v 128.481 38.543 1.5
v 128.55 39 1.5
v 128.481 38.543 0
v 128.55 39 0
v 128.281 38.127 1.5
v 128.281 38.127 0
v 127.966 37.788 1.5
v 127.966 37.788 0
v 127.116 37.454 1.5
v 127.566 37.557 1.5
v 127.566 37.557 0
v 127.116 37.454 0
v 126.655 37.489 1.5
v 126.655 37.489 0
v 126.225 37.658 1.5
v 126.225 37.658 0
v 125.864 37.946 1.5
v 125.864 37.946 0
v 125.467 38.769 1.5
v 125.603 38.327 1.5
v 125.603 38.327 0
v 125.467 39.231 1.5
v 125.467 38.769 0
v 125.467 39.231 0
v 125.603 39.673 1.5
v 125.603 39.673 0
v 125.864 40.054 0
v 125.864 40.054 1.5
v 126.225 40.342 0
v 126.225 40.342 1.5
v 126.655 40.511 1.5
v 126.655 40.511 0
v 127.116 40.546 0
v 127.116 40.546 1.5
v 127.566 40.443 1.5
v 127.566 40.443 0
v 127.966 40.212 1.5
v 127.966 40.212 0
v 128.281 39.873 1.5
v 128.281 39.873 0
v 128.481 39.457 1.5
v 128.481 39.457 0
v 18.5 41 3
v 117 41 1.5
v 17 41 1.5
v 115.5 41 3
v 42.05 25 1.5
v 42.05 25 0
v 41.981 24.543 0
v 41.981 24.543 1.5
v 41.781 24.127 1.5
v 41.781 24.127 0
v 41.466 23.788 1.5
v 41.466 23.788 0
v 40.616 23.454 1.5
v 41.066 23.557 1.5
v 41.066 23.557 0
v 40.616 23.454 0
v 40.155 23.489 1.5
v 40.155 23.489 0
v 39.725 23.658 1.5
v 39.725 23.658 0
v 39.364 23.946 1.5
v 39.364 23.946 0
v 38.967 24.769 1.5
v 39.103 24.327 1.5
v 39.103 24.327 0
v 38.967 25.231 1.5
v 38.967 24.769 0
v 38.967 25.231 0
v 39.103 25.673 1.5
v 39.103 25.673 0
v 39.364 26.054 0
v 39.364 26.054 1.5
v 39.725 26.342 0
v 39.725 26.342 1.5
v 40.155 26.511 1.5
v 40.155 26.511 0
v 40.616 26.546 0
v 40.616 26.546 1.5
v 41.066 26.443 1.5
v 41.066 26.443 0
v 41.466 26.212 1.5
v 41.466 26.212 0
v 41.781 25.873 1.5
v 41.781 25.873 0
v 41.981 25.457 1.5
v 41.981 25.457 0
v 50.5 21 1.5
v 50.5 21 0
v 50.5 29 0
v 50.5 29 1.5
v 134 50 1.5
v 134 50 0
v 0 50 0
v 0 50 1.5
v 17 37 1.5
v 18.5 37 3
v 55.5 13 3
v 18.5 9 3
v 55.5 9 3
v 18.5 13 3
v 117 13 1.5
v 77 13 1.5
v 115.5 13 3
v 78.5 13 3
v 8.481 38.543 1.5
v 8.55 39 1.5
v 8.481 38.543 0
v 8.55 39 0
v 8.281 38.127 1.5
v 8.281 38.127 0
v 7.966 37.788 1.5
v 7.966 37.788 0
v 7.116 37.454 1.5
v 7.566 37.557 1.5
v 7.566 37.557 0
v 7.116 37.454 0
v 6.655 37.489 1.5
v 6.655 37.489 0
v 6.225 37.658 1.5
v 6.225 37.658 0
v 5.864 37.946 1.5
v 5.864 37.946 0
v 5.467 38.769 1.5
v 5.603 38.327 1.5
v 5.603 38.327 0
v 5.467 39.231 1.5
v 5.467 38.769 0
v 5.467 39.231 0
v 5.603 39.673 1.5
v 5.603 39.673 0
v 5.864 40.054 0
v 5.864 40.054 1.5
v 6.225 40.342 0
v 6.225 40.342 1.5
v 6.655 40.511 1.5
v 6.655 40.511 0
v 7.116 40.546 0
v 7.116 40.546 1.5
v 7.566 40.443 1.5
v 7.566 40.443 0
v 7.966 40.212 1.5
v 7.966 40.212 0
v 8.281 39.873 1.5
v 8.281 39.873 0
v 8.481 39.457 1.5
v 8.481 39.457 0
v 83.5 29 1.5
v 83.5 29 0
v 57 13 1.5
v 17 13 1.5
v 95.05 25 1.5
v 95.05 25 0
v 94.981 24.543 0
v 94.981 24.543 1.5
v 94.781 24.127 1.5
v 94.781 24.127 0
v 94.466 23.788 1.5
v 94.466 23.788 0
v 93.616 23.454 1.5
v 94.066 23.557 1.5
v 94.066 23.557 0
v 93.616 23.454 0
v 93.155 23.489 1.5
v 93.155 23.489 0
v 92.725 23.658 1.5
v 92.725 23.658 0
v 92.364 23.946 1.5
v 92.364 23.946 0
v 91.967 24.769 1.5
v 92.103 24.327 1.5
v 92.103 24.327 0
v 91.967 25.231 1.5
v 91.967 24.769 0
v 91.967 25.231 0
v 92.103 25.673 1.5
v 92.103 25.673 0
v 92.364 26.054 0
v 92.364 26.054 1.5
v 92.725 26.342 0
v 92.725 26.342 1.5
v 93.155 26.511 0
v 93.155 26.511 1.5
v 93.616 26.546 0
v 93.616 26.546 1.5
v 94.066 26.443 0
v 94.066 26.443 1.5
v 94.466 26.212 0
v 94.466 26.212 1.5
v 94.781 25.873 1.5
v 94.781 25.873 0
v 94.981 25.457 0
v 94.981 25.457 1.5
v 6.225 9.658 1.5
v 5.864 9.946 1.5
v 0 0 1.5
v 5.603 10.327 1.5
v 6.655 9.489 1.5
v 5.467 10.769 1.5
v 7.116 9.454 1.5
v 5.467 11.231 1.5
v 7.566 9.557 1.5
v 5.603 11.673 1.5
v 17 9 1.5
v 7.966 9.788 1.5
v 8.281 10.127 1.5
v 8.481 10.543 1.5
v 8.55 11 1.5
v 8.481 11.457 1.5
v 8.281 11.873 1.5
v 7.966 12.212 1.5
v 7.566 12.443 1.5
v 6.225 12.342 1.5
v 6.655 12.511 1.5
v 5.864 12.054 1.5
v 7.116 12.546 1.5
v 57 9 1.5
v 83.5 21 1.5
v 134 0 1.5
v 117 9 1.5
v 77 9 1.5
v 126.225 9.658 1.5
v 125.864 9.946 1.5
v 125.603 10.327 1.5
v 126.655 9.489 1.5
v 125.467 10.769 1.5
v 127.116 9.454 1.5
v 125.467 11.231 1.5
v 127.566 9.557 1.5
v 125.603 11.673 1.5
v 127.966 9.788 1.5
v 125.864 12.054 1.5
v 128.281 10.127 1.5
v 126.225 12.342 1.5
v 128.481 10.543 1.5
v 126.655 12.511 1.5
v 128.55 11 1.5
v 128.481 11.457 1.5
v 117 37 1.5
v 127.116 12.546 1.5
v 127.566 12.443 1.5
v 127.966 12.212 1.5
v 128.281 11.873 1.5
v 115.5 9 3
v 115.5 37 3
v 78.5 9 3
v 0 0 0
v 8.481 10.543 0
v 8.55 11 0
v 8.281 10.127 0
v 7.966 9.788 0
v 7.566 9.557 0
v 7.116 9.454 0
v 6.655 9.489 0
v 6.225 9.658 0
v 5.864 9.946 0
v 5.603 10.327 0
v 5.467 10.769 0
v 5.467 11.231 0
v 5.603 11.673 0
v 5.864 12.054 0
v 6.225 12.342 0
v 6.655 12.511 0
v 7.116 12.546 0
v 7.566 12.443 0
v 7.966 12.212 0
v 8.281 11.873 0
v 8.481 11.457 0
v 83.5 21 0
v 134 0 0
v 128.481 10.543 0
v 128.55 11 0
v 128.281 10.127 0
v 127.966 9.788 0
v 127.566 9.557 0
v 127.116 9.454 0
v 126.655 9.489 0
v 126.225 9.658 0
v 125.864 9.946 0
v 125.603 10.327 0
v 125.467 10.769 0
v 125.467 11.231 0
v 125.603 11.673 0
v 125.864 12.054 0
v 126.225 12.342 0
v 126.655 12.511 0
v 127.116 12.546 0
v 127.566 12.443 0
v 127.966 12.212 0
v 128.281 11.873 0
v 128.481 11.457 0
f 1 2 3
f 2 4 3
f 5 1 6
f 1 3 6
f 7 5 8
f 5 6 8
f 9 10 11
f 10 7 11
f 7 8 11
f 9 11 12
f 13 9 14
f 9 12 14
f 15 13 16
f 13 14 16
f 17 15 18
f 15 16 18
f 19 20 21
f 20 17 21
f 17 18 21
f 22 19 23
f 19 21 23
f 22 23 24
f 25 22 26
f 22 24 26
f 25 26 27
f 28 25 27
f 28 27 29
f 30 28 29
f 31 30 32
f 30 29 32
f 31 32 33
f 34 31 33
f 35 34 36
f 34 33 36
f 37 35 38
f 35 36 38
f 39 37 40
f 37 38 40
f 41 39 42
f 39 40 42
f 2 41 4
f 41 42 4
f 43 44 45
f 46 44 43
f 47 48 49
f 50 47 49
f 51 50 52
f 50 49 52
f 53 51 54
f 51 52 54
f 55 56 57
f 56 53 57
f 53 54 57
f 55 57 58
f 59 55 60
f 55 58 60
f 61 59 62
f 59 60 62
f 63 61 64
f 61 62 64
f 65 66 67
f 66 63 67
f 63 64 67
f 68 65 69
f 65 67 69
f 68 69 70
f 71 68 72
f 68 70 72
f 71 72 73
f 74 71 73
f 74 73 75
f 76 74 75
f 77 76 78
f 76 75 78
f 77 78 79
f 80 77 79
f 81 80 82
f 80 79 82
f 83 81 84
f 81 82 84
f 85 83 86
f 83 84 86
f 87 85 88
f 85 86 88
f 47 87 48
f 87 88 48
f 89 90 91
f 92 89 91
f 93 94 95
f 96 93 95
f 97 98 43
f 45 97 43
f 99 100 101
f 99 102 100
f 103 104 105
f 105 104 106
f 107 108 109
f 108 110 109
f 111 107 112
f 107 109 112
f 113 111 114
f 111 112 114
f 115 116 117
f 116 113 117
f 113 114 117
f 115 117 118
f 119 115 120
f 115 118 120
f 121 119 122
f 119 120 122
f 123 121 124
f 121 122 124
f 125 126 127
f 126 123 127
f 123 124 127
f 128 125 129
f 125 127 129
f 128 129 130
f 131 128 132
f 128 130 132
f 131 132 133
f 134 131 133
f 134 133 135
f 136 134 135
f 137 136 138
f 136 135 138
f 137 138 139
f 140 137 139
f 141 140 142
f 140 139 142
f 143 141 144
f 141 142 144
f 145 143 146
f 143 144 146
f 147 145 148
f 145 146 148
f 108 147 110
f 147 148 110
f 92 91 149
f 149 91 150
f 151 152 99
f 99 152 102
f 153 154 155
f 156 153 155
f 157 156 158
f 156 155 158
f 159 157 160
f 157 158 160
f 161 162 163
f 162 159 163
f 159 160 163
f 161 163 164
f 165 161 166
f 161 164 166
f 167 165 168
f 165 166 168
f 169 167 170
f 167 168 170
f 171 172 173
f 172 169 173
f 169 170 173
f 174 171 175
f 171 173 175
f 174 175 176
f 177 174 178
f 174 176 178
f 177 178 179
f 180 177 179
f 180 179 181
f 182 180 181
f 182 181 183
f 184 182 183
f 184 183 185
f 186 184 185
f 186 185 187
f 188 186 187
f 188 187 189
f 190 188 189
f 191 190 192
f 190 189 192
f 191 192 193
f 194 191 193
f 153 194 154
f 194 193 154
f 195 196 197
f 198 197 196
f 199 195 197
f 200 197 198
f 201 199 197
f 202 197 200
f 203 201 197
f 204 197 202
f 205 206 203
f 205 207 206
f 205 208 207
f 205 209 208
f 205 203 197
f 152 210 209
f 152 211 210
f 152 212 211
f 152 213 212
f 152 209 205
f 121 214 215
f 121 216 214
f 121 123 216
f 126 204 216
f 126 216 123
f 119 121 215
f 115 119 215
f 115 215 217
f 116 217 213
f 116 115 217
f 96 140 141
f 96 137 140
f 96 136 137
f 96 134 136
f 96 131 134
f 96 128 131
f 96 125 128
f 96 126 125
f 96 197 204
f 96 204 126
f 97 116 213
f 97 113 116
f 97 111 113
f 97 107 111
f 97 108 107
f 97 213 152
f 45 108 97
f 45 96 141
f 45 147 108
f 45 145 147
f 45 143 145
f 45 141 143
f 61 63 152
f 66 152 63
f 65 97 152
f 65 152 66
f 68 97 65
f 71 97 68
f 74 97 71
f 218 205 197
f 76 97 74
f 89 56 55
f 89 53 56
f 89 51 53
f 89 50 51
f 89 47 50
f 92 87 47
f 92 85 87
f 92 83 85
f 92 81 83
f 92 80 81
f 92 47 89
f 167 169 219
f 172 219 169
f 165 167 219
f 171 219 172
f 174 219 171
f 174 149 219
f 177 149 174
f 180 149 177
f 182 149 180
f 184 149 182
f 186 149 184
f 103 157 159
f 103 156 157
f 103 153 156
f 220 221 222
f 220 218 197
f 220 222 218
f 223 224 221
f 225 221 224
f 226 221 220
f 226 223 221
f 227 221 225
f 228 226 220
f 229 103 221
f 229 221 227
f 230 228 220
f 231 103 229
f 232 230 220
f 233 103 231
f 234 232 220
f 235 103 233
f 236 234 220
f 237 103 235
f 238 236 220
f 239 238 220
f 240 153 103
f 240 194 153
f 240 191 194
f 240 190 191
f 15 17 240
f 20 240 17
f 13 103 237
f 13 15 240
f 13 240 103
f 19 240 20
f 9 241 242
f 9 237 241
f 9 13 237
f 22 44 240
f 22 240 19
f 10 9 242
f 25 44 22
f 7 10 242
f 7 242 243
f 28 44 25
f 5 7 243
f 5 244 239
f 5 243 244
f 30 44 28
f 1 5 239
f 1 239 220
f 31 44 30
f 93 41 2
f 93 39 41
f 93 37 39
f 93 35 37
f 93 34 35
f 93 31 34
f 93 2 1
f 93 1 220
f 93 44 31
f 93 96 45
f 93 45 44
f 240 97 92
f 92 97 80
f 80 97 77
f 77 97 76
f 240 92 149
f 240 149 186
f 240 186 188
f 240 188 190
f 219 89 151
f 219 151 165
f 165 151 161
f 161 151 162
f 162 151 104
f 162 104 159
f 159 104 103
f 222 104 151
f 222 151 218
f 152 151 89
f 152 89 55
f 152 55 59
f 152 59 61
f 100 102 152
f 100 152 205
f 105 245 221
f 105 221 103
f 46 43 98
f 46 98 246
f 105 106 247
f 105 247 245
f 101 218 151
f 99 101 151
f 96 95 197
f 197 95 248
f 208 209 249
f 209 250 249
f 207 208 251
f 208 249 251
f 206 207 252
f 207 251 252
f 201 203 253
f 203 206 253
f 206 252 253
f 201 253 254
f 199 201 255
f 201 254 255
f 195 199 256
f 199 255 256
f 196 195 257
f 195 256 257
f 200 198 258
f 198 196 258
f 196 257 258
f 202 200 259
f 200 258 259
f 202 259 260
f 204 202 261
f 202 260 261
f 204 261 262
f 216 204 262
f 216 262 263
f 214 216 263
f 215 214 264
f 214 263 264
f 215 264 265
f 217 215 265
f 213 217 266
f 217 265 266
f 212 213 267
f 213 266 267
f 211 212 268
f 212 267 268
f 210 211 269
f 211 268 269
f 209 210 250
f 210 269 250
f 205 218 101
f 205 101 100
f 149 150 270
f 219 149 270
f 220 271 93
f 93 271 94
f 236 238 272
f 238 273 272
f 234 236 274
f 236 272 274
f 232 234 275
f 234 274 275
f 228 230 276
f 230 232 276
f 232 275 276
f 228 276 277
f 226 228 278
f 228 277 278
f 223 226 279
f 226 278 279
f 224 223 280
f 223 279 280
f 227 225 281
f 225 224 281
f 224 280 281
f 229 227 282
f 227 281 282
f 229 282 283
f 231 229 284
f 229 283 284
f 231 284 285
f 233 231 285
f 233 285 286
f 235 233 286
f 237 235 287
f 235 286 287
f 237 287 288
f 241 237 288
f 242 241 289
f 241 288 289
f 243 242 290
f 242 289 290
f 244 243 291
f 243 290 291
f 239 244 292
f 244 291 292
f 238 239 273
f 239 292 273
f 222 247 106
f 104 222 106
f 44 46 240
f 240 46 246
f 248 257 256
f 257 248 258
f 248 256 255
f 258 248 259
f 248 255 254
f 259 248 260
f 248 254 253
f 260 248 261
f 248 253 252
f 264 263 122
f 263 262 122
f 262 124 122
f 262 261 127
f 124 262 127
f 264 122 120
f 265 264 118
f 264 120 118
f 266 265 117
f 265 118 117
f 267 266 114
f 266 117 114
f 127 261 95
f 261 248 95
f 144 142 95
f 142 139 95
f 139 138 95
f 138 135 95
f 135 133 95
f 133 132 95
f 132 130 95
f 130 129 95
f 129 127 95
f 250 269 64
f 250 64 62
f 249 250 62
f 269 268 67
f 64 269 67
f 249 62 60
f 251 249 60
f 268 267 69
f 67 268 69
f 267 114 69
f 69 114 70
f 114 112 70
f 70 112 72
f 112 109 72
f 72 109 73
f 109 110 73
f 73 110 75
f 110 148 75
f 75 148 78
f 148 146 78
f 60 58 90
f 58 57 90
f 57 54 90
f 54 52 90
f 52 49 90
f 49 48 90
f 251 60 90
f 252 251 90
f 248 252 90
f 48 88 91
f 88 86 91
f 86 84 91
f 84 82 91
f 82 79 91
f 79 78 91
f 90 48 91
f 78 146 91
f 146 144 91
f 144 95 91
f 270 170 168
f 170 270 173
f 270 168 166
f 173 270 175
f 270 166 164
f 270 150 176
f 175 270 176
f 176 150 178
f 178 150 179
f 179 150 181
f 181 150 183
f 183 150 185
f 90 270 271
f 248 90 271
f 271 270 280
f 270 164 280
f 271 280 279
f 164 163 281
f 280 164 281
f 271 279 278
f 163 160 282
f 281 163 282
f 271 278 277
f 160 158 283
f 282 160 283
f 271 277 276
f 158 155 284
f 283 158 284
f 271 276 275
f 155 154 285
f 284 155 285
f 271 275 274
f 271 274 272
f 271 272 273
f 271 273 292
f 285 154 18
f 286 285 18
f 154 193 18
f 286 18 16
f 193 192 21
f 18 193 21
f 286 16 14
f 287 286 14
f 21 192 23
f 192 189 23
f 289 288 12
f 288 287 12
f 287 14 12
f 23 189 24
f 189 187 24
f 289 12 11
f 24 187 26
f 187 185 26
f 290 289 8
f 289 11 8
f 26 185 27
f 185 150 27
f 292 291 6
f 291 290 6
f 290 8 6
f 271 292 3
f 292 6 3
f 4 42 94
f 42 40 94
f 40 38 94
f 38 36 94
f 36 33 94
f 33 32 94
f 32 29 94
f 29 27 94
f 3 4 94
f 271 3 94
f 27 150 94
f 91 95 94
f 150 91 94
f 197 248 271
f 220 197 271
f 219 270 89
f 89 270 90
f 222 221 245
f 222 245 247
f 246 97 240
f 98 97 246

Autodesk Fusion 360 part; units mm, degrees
sketch "Sketch1" plane through (0, 0, 0) normal (0, 0, 1) x (1, 0, 0)
  line L0 (0, 0) -> (134, 0)
  line L1 (134, 0) -> (134, 50)
  line L2 (134, 50) -> (0, 50)
  line L3 (0, 50) -> (0, 0)
  circle A0 centre (7, 39) radius 1.55
  circle A1 centre (7, 11) radius 1.55
  circle A2 centre (127, 39) radius 1.55
  circle A3 centre (127, 11) radius 1.55
  line L4 (83.5, 21) -> (50.5, 21)
  line L5 (50.5, 21) -> (50.5, 29)
  line L6 (50.5, 29) -> (83.5, 29)
  line L7 (83.5, 29) -> (83.5, 21)
  line L8 (83.5, 21) -> (50.5, 29) construction
  line L9 (50.5, 21) -> (83.5, 29) construction
  line L10 (0, 25) -> (134, 25) construction
  circle A4 centre (40.5, 25) radius 1.55
  circle A5 centre (93.5, 25) radius 1.55
  line L11 (7, 11) -> (127, 11) construction
  line L12 (117, 9) -> (17, 9)
  line L13 (17, 9) -> (17, 13)
  line L14 (17, 13) -> (117, 13)
  line L15 (117, 13) -> (117, 9)
  line L16 (117, 9) -> (17, 13) construction
  line L17 (17, 9) -> (117, 13) construction
  line L18 (117, 41) -> (17, 41)
  line L19 (17, 41) -> (17, 37)
  line L20 (17, 37) -> (117, 37)
  line L21 (117, 37) -> (117, 41)
  line L22 (77, 9) -> (57, 9)
  line L23 (57, 9) -> (57, 13)
  line L24 (57, 13) -> (77, 13)
  line L25 (77, 13) -> (77, 9)
  line L26 (77, 9) -> (57, 13) construction
  line L27 (57, 9) -> (77, 13) construction
  point P0 (67, 25)
  point P1 (67, 11)
  point P2 (67, 11)
  dimension "d1" = 134
  dimension "d2" = 50
  dimension "d3" = 3.1
  dimension "d4" = 11
  dimension "d5" = 7
  dimension "d6" = 3.1
  dimension "d7" = 3.1
  dimension "d8" = 3.1
  dimension "d9" = 7
  dimension "d10" = 11
  dimension "d11" = 11
  dimension "d12" = 7
  dimension "d13" = 7
  dimension "d14" = 11
  dimension "d15" = 33
  dimension "d16" = 8
  dimension "d17" = 21
  dimension "d18" = 50.5
  dimension "d19" = 3.1
  dimension "d20" = 26.5
  dimension "d21" = 3.1
  dimension "d22" = 26.5
  dimension "d28" = 4
extrude "Extrude1" add sketch "Sketch1" along normal blind 1.5 contours L0 L1 L2 L3 | L12 L14 L15 L25 | L12 L14 L22 L23 L24 L25 | L12 L13 L14 L23 | L18 L19 L20 L21
extrude "Extrude2" add sketch "Sketch1" along normal blind 3 contours L12 L14 L15 L25 | L12 L13 L14 L23 | L18 L19 L20 L21
chamfer "Chamfer1" distance 1.5 angle 45 4 edges at (117, 11, 3) (117, 39, 3) (17, 39, 3) (17, 11, 3)
chamfer "Chamfer2" distance 1.5 angle 45 2 edges at (57, 11, 3) (77, 11, 3)
equation "d6 = d3"
equation "d7 = d3"
equation "d8 = d3"
equation "d9 = d5"
equation "d10 = d4"
equation "d11 = d4"
equation "d12 = d5"
equation "d13 = d5"
equation "d14 = d4"
equation "d19 = d3"
equation "d21 = d3"
equation "d22 = d20"
